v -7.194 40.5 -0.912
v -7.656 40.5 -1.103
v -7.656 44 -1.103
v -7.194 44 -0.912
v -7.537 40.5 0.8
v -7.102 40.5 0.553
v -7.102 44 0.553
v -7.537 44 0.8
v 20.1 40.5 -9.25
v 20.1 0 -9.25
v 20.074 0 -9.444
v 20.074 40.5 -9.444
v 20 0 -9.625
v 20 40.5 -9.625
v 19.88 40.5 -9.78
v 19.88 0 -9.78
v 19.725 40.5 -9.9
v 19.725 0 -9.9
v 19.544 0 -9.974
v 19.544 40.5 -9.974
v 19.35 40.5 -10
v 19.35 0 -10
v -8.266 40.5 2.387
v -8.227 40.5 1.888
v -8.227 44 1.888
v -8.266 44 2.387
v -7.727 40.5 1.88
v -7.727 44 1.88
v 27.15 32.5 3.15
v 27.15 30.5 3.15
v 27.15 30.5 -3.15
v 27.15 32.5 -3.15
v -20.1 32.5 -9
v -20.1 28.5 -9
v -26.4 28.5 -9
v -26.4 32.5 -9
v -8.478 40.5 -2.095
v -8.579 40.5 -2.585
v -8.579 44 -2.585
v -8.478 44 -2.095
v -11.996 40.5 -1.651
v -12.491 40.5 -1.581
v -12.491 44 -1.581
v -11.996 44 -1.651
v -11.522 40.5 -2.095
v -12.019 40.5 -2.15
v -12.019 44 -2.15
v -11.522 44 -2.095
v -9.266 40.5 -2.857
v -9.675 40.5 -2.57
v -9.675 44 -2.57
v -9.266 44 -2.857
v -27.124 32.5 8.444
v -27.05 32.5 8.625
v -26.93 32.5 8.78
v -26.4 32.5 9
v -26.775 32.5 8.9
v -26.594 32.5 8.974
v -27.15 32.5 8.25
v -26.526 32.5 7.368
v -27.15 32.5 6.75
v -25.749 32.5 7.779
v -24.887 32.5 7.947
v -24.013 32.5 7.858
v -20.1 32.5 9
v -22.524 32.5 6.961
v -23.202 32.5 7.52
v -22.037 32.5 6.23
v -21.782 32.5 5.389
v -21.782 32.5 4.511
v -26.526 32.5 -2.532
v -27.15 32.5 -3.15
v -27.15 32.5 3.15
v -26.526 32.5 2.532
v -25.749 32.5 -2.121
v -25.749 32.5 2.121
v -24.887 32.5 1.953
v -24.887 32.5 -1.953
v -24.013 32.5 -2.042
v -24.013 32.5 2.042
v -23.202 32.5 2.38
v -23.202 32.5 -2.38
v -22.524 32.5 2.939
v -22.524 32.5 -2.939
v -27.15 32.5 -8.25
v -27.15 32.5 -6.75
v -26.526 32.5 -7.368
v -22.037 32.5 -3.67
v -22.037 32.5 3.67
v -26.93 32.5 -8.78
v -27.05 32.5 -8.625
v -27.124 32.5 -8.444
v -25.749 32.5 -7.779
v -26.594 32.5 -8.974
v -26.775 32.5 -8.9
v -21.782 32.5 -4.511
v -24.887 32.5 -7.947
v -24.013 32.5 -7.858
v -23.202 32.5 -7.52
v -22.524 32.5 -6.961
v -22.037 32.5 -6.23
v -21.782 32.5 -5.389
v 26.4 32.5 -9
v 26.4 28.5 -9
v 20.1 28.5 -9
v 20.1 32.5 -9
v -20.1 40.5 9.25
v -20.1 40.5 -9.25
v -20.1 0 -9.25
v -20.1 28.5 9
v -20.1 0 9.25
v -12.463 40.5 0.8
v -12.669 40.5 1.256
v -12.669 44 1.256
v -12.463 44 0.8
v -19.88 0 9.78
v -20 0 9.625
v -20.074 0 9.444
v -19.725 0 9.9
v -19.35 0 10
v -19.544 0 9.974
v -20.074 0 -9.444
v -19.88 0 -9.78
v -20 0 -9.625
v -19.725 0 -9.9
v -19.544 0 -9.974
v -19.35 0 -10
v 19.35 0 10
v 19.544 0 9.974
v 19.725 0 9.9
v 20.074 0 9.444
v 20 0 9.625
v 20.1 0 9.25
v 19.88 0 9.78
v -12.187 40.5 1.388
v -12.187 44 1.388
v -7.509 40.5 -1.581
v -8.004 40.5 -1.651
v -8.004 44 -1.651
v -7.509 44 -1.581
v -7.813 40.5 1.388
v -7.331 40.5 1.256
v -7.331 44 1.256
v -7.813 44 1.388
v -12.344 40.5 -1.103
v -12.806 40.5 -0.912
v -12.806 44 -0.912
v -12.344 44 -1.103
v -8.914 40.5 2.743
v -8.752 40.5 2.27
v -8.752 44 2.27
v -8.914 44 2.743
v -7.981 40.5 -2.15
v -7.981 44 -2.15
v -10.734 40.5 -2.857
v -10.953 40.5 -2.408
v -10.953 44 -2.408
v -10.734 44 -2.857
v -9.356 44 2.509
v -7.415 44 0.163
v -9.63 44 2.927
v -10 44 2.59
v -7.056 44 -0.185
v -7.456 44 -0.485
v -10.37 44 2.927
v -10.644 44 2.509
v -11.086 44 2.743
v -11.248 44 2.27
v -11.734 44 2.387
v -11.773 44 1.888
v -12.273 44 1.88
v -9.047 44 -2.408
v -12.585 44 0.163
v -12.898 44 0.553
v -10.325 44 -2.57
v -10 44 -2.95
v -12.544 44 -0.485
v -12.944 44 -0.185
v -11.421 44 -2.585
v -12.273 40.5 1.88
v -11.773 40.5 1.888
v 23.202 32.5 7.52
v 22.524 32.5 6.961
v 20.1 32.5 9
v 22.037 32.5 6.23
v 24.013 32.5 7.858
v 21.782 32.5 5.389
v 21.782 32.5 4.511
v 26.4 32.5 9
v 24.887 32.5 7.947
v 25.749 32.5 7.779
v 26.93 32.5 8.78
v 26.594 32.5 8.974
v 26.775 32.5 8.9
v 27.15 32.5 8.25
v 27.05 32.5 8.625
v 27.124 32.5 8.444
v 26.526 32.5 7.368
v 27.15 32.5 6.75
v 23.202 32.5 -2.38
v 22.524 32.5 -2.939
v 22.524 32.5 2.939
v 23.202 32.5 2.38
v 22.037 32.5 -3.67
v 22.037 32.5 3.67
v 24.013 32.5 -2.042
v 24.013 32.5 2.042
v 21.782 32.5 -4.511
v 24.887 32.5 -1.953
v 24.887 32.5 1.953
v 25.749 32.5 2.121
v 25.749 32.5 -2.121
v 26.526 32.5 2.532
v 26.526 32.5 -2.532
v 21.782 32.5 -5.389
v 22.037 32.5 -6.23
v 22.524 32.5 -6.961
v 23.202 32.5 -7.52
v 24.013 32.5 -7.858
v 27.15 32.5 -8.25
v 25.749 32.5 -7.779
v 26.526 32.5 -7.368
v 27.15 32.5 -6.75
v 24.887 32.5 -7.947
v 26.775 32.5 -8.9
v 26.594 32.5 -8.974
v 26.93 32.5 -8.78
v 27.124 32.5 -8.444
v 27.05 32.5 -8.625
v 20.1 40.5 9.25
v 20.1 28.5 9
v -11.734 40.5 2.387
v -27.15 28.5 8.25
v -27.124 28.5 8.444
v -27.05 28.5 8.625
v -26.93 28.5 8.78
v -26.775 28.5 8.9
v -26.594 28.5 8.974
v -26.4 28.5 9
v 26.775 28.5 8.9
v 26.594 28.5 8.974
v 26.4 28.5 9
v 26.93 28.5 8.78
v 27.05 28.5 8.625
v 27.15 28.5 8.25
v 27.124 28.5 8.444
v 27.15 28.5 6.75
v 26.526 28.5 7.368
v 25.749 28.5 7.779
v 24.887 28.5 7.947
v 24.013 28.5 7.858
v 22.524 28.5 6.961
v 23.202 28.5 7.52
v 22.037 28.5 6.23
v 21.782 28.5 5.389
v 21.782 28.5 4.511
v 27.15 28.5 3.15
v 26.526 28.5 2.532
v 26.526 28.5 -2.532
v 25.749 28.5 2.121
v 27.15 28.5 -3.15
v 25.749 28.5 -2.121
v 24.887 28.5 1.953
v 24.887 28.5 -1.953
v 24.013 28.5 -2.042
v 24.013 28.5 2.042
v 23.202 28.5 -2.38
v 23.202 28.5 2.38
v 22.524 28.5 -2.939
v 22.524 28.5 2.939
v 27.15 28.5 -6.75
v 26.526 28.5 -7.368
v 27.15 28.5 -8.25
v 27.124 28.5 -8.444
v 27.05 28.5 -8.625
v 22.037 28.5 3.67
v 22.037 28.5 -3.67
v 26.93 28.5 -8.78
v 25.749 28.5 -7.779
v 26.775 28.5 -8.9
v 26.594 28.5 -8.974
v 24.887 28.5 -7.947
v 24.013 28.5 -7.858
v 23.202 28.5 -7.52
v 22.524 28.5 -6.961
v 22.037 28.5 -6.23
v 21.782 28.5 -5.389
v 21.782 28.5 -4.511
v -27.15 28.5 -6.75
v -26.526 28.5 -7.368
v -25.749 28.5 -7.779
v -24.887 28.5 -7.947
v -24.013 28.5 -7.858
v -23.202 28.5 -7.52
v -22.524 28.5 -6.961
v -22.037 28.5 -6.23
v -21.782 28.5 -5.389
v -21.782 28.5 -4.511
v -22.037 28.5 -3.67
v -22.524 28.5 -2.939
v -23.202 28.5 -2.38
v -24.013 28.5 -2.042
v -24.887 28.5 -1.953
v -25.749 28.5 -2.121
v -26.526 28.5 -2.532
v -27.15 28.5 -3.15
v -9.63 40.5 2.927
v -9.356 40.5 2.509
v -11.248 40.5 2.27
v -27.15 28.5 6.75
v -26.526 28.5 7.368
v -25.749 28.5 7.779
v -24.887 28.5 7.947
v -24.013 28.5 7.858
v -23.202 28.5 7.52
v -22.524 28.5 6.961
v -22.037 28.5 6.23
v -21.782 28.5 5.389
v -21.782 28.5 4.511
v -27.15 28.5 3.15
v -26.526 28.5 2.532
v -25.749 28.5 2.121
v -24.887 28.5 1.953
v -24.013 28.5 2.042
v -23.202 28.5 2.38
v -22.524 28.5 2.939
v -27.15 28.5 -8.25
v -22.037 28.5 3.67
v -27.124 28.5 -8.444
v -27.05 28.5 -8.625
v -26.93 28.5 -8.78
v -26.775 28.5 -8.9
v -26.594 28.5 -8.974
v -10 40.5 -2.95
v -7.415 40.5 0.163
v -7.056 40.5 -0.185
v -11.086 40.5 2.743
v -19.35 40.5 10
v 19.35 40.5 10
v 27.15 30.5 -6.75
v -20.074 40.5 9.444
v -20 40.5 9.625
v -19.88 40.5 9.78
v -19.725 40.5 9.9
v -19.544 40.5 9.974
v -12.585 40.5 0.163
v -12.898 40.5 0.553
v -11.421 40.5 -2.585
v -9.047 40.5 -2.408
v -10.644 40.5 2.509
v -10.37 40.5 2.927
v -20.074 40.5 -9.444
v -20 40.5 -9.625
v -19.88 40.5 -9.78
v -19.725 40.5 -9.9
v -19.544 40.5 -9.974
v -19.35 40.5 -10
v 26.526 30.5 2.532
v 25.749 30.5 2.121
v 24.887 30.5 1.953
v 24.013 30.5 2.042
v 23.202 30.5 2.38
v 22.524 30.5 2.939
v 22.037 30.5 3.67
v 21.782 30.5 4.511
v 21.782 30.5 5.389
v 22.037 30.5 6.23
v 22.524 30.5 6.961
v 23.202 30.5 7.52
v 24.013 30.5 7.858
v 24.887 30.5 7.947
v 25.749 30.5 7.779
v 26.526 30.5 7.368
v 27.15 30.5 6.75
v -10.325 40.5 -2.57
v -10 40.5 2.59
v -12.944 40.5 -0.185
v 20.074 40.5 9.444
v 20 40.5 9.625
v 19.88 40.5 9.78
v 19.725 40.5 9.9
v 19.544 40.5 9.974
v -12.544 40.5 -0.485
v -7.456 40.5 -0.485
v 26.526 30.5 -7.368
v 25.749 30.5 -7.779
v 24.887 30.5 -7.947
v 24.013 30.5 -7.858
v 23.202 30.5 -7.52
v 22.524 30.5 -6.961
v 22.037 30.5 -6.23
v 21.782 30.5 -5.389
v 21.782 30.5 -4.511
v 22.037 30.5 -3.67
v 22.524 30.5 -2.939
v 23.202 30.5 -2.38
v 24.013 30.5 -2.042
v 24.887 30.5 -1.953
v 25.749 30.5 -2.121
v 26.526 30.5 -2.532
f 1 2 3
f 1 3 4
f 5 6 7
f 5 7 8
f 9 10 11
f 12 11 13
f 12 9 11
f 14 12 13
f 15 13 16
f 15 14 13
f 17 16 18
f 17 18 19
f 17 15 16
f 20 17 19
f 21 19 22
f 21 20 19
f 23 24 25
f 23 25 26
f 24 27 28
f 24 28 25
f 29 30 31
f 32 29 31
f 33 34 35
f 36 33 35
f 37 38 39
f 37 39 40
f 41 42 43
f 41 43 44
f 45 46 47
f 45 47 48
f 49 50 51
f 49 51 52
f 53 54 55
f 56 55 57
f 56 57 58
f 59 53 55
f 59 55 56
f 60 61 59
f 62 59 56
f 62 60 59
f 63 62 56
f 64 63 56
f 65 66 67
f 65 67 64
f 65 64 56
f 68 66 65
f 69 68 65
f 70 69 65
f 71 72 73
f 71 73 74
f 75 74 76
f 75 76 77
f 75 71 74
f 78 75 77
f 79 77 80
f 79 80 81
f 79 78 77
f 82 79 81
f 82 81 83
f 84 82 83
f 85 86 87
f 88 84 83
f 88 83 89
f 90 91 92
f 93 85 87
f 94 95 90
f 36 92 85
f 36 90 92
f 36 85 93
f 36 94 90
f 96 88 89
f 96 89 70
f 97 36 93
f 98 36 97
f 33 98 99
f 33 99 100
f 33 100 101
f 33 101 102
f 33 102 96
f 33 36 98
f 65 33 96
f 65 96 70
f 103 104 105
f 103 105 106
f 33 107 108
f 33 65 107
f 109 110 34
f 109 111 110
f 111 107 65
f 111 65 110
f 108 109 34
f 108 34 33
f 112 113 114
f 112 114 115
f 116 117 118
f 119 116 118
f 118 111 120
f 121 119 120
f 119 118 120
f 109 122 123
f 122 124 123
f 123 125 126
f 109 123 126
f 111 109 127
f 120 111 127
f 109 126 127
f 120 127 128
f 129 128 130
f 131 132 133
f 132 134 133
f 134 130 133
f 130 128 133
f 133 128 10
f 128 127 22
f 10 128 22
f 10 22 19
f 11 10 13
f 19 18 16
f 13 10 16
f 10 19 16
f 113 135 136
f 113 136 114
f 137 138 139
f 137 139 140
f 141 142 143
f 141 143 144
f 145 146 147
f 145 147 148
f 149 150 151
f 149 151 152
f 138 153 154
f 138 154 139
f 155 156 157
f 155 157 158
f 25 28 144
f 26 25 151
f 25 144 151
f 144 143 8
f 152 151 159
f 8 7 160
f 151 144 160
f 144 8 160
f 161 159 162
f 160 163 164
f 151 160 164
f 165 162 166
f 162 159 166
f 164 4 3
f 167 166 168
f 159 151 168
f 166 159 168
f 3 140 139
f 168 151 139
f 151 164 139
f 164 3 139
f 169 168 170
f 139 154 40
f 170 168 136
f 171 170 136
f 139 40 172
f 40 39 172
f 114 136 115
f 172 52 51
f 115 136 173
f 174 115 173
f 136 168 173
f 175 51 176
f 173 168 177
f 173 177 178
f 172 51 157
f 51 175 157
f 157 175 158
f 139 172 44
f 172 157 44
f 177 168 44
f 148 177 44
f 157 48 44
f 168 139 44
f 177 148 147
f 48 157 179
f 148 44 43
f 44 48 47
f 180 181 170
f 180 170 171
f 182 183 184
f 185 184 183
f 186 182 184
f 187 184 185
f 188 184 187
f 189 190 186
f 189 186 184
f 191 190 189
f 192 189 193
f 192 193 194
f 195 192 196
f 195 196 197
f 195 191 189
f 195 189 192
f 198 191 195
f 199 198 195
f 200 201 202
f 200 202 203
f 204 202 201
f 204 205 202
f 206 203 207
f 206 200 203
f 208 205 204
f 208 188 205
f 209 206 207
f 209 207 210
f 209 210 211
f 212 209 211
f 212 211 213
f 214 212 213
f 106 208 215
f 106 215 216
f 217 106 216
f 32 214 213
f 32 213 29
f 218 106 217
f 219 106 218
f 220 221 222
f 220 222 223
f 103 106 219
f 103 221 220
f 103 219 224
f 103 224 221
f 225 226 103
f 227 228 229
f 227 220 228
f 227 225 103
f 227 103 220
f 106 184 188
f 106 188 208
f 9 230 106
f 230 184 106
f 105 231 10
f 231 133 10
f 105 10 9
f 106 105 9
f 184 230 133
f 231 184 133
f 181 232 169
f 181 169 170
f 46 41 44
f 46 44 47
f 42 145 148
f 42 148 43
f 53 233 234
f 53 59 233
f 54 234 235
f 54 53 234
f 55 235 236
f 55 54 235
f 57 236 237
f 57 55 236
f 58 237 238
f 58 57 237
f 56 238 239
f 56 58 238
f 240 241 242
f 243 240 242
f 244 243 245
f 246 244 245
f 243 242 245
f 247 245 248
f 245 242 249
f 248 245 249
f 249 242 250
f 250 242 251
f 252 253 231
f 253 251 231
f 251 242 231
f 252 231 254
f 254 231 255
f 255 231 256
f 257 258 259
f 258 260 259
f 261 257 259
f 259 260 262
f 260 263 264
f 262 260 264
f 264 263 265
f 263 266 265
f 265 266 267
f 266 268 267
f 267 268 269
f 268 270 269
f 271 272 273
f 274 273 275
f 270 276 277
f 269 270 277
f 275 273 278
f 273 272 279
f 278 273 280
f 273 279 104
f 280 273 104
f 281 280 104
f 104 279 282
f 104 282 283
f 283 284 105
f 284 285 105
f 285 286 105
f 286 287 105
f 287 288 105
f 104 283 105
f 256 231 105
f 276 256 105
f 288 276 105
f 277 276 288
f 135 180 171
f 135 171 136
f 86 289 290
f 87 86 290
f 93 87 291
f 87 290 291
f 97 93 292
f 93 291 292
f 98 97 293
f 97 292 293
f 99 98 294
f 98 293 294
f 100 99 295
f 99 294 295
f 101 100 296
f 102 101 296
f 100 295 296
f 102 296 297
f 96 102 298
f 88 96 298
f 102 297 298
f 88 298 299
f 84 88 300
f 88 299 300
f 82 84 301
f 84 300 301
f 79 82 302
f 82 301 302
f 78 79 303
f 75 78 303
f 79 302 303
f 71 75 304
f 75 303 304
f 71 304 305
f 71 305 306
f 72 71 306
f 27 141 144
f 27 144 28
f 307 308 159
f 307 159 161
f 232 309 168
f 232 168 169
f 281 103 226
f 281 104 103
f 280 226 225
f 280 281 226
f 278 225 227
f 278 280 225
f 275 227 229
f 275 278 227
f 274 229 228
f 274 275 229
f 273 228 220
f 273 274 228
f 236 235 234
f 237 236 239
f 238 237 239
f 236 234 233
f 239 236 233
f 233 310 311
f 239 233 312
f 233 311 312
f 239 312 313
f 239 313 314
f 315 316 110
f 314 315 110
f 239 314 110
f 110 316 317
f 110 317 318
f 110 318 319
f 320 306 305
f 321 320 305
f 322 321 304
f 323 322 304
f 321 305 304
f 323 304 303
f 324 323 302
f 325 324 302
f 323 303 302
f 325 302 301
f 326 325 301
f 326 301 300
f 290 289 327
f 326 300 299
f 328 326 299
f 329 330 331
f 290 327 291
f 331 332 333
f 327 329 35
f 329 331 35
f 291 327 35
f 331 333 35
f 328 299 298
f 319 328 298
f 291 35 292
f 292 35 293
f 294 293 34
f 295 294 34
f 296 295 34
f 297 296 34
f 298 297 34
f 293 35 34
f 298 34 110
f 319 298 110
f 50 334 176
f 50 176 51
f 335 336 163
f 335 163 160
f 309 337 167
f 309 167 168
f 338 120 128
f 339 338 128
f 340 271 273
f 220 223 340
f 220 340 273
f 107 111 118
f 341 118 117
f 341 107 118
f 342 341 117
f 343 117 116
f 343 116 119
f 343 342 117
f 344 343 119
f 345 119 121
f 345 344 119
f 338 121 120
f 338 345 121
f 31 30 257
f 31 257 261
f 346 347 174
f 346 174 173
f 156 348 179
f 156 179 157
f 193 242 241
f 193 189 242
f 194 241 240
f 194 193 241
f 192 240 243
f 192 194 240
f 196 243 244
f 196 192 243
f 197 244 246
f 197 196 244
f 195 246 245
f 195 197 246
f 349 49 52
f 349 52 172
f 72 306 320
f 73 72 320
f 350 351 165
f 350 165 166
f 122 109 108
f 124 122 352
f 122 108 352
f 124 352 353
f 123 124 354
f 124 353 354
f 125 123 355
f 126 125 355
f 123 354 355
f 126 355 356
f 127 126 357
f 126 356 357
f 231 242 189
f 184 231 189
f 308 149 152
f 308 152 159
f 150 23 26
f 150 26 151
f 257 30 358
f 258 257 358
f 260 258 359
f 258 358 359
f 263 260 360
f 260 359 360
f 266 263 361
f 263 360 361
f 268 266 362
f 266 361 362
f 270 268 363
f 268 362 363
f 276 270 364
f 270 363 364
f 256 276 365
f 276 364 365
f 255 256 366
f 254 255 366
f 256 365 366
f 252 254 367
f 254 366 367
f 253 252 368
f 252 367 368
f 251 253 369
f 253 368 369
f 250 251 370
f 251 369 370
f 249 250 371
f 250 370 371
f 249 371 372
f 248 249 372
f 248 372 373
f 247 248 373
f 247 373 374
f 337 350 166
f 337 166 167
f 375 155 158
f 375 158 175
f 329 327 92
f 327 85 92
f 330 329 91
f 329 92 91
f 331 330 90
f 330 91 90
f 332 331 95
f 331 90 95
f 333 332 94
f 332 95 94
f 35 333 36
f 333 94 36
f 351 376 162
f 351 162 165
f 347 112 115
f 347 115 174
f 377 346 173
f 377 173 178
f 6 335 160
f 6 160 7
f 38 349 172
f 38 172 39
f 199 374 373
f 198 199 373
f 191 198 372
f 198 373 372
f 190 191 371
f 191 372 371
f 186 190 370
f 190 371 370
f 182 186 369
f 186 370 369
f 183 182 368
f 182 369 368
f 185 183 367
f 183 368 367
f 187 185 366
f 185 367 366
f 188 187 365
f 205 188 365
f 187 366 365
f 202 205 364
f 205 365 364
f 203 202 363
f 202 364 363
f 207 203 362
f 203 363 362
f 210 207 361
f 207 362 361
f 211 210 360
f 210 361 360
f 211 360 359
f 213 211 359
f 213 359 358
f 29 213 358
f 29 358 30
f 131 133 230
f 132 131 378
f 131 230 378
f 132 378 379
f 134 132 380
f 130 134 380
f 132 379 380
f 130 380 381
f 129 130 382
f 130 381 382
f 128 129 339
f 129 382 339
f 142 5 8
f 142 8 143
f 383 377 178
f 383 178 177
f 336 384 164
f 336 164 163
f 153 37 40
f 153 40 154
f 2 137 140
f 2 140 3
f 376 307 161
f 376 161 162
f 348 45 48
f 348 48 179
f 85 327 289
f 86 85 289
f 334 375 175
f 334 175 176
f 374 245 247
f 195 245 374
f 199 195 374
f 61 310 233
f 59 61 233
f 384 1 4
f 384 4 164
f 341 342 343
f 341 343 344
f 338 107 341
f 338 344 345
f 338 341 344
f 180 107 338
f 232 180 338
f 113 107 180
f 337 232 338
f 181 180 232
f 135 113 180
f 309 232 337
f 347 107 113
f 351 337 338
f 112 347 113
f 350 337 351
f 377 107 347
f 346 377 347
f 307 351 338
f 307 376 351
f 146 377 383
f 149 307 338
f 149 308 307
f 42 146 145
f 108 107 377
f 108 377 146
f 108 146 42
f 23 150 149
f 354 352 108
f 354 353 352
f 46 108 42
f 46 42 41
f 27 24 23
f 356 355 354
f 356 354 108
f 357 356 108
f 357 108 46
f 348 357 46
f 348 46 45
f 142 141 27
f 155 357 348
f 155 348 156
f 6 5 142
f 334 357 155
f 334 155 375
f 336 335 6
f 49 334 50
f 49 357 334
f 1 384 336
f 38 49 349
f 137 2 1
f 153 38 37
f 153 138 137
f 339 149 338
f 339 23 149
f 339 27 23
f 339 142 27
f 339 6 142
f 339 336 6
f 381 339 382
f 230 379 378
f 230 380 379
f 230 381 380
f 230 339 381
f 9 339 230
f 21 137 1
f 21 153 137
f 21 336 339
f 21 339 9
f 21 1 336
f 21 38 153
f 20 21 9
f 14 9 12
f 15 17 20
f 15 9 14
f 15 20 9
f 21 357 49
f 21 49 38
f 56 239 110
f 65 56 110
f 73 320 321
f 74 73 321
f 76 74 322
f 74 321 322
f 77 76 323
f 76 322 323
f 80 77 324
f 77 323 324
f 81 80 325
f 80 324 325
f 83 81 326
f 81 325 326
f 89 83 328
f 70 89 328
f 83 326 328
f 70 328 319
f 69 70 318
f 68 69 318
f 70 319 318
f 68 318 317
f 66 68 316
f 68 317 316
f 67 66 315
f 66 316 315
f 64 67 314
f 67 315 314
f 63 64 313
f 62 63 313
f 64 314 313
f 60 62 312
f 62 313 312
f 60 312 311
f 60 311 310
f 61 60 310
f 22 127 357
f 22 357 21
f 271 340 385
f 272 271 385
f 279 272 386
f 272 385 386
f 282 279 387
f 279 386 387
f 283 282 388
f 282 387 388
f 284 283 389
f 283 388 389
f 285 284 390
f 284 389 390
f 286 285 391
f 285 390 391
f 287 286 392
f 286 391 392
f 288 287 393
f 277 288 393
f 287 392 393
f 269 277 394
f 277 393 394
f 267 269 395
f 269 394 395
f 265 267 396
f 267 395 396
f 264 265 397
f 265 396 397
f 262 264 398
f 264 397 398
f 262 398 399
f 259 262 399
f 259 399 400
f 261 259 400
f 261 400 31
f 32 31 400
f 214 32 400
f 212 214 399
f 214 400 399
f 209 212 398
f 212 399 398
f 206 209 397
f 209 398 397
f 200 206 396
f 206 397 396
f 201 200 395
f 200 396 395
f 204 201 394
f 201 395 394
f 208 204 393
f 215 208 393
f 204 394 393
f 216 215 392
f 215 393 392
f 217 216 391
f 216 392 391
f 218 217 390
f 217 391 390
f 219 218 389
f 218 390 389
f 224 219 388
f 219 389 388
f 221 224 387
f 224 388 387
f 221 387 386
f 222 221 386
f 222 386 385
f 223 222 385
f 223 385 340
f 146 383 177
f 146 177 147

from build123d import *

# Parameters (mm, degrees)
SKETCH1_W           = 40.2
SKETCH1_H           = 20
BOSS_EXTRUDE1_DEPTH = 40.5
SKETCH2_W           = 18
SKETCH2_H           = 2
BOSS_EXTRUDE2_DEPTH = 7.05
SKETCH5_R           = 3
CUT_EXTRUDE1_DEPTH  = 7.05
MIRROR2_START       = 28.5
MIRROR2_DEPTH       = 4
FILLET2_R           = 0.75
BOSS_EXTRUDE3_DEPTH = 3.5


# Read off the part's stored shape, not the designer's step: Mirror2
with BuildPart() as part:
    # Sketch1 → Boss-Extrude1 (new body)
    with BuildSketch(Plane(origin=(0, 0, 0), x_dir=(1, 0, 0), z_dir=(0, 1, 0))):
        Rectangle(SKETCH1_W, SKETCH1_H)
    extrude(amount=BOSS_EXTRUDE1_DEPTH)

    # Sketch2 → Boss-Extrude2 (add)
    with BuildSketch(Plane(origin=(20.1, 0, 0), x_dir=(0, 0, -1), z_dir=(1, 0, 0))):
        with Locations((0, 29.5)):
            Rectangle(SKETCH2_W, SKETCH2_H)
    extrude(amount=BOSS_EXTRUDE2_DEPTH)

    # Sketch5 → Cut-Extrude1 (cut)
    with BuildSketch(Plane(origin=(0, 30.5, 0), x_dir=(1, 0, 0), z_dir=(0, 1, 0))):
        with Locations((24.75, 4.95)):
            Circle(SKETCH5_R)
        with Locations((24.75, -4.95)):
            Circle(SKETCH5_R)
    extrude(amount=-CUT_EXTRUDE1_DEPTH, mode=Mode.SUBTRACT)

    # Mirror2 outline → Mirror2 (add)
    with BuildSketch(Plane(origin=(0, 0, 0), x_dir=(1, 0, 0), z_dir=(0, 1, 0)).offset(MIRROR2_START)):
        with BuildLine():
            Line((-27.15, 3.15), (-27.15, -3.15))
            ThreePointArc((-27.15, -3.15), (-21.75, -4.95), (-27.15, -6.75))
            Line((-27.15, -6.75), (-27.15, -9))
            Line((-27.15, -9), (-20.1, -9))
            Line((-20.1, -9), (-20.1, 9))
            Line((-20.1, 9), (-27.15, 9))
            Line((-27.15, 9), (-27.15, 6.75))
            ThreePointArc((-27.15, 6.75), (-21.75, 4.95), (-27.15, 3.15))
        make_face()
        with BuildLine():
            Line((27.15, 6.75), (27.15, 9))
            Line((27.15, 9), (20.1, 9))
            Line((20.1, 9), (20.1, -9))
            Line((20.1, -9), (27.15, -9))
            Line((27.15, -9), (27.15, -6.75))
            ThreePointArc((27.15, -6.75), (21.75, -4.95), (27.15, -3.15))
            Line((27.15, -3.15), (27.15, 3.15))
            ThreePointArc((27.15, 3.15), (21.75, 4.95), (27.15, 6.75))
        make_face()
    extrude(amount=MIRROR2_DEPTH)

    # Fillet2
    fillet2_edges = [part.edges().sort_by_distance(p)[0] for p in [
        (27.15, 30.5, 9),
        (27.15, 30.5, -9),
        (-27.15, 30.5, 9),
        (-27.15, 30.5, -9),
        (20.1, 20.25, 10),
        (-20.1, 20.25, 10),
        (-20.1, 20.25, -10),
        (20.1, 20.25, -10),
    ]]
    fillet(fillet2_edges, radius=FILLET2_R)

    # Sketch6 → Boss-Extrude3 (add)
    with BuildSketch(Plane(origin=(0, 40.5, 0), x_dir=(1, 0, 0), z_dir=(0, 1, 0))):
        Polygon((-9.266364833, 2.857320325), (-9.046549886, 2.408140097), (-8.578826661, 2.585104706), (-8.477624186, 2.095370547), (-7.980586038, 2.150457451), (-8.004354957, 1.650941158), (-7.50923262, 1.580689045), (-7.656479445, 1.102777065), (-7.194383277, 0.911600133), (-7.455855949, 0.485321434), (-7.055821151, 0.185232033), (-7.41509038, -0.162628729), (-7.10225261, -0.552774878), (-7.536744189, -0.80036033), (-7.330760195, -1.25604891), (-7.81317342, -1.387802348), (-7.726985934, -1.88040077), (-8.227009008, -1.888043641), (-8.266033506, -2.386600133), (-8.75224814, -2.269652207), (-8.91403257, -2.742840633), (-9.355888111, -2.508650179), (-9.630266961, -2.926738369), (-10, -2.590020434), (-10.369733039, -2.926738369), (-10.644111889, -2.508650179), (-11.08596743, -2.742840633), (-11.24775186, -2.269652207), (-11.733966494, -2.386600133), (-11.772990992, -1.888043641), (-12.273014066, -1.88040077), (-12.18682658, -1.387802348), (-12.669239805, -1.25604891), (-12.463255811, -0.80036033), (-12.89774739, -0.552774878), (-12.58490962, -0.162628729), (-12.944178849, 0.185232033), (-12.544144051, 0.485321434), (-12.805616723, 0.911600133), (-12.343520555, 1.102777065), (-12.49076738, 1.580689045), (-11.995645043, 1.650941158), (-12.019413962, 2.150457451), (-11.522375814, 2.095370547), (-11.421173339, 2.585104706), (-10.953450114, 2.408140097), (-10.733635167, 2.857320325), (-10.324615636, 2.569597349), (-10, 2.95), (-9.675384364, 2.569597349), align=None)
    extrude(amount=BOSS_EXTRUDE3_DEPTH)


solid = part.part
